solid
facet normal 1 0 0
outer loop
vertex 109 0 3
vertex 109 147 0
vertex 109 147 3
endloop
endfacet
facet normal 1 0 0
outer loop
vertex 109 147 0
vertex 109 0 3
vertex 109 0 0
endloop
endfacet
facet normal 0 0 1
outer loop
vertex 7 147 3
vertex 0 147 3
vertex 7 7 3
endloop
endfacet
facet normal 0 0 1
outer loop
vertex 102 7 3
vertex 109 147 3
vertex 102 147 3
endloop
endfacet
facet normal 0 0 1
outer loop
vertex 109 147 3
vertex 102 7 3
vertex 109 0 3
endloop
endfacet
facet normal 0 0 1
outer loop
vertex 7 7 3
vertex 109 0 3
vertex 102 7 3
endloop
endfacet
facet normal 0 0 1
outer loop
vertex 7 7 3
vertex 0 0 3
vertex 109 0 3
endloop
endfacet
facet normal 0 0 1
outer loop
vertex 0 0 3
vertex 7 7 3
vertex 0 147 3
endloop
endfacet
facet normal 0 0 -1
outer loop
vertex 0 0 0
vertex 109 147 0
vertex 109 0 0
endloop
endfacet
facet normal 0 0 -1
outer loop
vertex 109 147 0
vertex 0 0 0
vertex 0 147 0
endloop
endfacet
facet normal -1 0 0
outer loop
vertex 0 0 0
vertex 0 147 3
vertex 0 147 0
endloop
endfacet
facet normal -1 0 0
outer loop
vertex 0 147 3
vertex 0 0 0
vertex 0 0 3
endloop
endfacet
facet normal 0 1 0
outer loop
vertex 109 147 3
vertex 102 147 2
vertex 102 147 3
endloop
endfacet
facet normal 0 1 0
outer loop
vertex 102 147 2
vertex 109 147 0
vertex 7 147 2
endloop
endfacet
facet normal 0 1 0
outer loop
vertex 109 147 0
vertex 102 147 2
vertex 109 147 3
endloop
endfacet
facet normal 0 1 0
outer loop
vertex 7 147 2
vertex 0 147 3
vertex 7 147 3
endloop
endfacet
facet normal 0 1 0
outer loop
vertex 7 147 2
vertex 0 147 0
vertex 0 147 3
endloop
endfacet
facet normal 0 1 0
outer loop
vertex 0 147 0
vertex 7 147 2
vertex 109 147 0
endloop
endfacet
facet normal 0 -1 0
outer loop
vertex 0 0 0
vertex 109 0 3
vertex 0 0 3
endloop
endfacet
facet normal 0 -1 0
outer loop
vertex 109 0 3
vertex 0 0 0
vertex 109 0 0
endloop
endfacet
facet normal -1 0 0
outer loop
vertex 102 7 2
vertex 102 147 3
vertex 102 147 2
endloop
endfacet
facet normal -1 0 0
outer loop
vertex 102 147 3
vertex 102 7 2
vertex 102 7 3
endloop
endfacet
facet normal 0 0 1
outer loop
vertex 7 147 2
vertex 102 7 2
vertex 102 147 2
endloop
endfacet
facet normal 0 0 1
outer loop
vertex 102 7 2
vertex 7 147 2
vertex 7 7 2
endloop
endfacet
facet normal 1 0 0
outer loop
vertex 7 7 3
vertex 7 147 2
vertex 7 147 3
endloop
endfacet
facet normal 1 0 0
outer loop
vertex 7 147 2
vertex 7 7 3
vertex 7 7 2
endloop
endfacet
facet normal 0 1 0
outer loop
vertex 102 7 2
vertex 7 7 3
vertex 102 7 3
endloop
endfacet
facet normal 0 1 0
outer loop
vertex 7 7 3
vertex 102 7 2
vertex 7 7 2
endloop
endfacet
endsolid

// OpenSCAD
module bottom(){
    difference(){
        cube([109,147,3]);
        translate([7,7,2])cube([95,140,1]);
    }
}

module frame(){
    points=[
        [0,0,0],[109,0,0],[109,147,0],[0,147,0],
        [0,0,7],[109,0,7],[109,147,7],[0,147,7],
        [10,10,0],[98,10,0],[98,136,0],[10,136,0],
        [10,10,2],[98,10,2],[98,136,2],[10,136,2]
    ];

    faces=[
        [0,1,9,8],[1,2,10,9],[2,3,11,10],[3,0,8,11],
        [4,5,13,12],[5,6,14,13],[6,7,15,14],[7,4,12,15],
        [0,1,5,4],[1,2,6,5],[2,3,7,6],[3,0,4,7],
        [8,9,13,12],[9,10,14,13],[10,11,15,14],[11,8,12,15]
    ];

    translate([0,0,3])polyhedron(points,faces);
}

//frame();
bottom();
